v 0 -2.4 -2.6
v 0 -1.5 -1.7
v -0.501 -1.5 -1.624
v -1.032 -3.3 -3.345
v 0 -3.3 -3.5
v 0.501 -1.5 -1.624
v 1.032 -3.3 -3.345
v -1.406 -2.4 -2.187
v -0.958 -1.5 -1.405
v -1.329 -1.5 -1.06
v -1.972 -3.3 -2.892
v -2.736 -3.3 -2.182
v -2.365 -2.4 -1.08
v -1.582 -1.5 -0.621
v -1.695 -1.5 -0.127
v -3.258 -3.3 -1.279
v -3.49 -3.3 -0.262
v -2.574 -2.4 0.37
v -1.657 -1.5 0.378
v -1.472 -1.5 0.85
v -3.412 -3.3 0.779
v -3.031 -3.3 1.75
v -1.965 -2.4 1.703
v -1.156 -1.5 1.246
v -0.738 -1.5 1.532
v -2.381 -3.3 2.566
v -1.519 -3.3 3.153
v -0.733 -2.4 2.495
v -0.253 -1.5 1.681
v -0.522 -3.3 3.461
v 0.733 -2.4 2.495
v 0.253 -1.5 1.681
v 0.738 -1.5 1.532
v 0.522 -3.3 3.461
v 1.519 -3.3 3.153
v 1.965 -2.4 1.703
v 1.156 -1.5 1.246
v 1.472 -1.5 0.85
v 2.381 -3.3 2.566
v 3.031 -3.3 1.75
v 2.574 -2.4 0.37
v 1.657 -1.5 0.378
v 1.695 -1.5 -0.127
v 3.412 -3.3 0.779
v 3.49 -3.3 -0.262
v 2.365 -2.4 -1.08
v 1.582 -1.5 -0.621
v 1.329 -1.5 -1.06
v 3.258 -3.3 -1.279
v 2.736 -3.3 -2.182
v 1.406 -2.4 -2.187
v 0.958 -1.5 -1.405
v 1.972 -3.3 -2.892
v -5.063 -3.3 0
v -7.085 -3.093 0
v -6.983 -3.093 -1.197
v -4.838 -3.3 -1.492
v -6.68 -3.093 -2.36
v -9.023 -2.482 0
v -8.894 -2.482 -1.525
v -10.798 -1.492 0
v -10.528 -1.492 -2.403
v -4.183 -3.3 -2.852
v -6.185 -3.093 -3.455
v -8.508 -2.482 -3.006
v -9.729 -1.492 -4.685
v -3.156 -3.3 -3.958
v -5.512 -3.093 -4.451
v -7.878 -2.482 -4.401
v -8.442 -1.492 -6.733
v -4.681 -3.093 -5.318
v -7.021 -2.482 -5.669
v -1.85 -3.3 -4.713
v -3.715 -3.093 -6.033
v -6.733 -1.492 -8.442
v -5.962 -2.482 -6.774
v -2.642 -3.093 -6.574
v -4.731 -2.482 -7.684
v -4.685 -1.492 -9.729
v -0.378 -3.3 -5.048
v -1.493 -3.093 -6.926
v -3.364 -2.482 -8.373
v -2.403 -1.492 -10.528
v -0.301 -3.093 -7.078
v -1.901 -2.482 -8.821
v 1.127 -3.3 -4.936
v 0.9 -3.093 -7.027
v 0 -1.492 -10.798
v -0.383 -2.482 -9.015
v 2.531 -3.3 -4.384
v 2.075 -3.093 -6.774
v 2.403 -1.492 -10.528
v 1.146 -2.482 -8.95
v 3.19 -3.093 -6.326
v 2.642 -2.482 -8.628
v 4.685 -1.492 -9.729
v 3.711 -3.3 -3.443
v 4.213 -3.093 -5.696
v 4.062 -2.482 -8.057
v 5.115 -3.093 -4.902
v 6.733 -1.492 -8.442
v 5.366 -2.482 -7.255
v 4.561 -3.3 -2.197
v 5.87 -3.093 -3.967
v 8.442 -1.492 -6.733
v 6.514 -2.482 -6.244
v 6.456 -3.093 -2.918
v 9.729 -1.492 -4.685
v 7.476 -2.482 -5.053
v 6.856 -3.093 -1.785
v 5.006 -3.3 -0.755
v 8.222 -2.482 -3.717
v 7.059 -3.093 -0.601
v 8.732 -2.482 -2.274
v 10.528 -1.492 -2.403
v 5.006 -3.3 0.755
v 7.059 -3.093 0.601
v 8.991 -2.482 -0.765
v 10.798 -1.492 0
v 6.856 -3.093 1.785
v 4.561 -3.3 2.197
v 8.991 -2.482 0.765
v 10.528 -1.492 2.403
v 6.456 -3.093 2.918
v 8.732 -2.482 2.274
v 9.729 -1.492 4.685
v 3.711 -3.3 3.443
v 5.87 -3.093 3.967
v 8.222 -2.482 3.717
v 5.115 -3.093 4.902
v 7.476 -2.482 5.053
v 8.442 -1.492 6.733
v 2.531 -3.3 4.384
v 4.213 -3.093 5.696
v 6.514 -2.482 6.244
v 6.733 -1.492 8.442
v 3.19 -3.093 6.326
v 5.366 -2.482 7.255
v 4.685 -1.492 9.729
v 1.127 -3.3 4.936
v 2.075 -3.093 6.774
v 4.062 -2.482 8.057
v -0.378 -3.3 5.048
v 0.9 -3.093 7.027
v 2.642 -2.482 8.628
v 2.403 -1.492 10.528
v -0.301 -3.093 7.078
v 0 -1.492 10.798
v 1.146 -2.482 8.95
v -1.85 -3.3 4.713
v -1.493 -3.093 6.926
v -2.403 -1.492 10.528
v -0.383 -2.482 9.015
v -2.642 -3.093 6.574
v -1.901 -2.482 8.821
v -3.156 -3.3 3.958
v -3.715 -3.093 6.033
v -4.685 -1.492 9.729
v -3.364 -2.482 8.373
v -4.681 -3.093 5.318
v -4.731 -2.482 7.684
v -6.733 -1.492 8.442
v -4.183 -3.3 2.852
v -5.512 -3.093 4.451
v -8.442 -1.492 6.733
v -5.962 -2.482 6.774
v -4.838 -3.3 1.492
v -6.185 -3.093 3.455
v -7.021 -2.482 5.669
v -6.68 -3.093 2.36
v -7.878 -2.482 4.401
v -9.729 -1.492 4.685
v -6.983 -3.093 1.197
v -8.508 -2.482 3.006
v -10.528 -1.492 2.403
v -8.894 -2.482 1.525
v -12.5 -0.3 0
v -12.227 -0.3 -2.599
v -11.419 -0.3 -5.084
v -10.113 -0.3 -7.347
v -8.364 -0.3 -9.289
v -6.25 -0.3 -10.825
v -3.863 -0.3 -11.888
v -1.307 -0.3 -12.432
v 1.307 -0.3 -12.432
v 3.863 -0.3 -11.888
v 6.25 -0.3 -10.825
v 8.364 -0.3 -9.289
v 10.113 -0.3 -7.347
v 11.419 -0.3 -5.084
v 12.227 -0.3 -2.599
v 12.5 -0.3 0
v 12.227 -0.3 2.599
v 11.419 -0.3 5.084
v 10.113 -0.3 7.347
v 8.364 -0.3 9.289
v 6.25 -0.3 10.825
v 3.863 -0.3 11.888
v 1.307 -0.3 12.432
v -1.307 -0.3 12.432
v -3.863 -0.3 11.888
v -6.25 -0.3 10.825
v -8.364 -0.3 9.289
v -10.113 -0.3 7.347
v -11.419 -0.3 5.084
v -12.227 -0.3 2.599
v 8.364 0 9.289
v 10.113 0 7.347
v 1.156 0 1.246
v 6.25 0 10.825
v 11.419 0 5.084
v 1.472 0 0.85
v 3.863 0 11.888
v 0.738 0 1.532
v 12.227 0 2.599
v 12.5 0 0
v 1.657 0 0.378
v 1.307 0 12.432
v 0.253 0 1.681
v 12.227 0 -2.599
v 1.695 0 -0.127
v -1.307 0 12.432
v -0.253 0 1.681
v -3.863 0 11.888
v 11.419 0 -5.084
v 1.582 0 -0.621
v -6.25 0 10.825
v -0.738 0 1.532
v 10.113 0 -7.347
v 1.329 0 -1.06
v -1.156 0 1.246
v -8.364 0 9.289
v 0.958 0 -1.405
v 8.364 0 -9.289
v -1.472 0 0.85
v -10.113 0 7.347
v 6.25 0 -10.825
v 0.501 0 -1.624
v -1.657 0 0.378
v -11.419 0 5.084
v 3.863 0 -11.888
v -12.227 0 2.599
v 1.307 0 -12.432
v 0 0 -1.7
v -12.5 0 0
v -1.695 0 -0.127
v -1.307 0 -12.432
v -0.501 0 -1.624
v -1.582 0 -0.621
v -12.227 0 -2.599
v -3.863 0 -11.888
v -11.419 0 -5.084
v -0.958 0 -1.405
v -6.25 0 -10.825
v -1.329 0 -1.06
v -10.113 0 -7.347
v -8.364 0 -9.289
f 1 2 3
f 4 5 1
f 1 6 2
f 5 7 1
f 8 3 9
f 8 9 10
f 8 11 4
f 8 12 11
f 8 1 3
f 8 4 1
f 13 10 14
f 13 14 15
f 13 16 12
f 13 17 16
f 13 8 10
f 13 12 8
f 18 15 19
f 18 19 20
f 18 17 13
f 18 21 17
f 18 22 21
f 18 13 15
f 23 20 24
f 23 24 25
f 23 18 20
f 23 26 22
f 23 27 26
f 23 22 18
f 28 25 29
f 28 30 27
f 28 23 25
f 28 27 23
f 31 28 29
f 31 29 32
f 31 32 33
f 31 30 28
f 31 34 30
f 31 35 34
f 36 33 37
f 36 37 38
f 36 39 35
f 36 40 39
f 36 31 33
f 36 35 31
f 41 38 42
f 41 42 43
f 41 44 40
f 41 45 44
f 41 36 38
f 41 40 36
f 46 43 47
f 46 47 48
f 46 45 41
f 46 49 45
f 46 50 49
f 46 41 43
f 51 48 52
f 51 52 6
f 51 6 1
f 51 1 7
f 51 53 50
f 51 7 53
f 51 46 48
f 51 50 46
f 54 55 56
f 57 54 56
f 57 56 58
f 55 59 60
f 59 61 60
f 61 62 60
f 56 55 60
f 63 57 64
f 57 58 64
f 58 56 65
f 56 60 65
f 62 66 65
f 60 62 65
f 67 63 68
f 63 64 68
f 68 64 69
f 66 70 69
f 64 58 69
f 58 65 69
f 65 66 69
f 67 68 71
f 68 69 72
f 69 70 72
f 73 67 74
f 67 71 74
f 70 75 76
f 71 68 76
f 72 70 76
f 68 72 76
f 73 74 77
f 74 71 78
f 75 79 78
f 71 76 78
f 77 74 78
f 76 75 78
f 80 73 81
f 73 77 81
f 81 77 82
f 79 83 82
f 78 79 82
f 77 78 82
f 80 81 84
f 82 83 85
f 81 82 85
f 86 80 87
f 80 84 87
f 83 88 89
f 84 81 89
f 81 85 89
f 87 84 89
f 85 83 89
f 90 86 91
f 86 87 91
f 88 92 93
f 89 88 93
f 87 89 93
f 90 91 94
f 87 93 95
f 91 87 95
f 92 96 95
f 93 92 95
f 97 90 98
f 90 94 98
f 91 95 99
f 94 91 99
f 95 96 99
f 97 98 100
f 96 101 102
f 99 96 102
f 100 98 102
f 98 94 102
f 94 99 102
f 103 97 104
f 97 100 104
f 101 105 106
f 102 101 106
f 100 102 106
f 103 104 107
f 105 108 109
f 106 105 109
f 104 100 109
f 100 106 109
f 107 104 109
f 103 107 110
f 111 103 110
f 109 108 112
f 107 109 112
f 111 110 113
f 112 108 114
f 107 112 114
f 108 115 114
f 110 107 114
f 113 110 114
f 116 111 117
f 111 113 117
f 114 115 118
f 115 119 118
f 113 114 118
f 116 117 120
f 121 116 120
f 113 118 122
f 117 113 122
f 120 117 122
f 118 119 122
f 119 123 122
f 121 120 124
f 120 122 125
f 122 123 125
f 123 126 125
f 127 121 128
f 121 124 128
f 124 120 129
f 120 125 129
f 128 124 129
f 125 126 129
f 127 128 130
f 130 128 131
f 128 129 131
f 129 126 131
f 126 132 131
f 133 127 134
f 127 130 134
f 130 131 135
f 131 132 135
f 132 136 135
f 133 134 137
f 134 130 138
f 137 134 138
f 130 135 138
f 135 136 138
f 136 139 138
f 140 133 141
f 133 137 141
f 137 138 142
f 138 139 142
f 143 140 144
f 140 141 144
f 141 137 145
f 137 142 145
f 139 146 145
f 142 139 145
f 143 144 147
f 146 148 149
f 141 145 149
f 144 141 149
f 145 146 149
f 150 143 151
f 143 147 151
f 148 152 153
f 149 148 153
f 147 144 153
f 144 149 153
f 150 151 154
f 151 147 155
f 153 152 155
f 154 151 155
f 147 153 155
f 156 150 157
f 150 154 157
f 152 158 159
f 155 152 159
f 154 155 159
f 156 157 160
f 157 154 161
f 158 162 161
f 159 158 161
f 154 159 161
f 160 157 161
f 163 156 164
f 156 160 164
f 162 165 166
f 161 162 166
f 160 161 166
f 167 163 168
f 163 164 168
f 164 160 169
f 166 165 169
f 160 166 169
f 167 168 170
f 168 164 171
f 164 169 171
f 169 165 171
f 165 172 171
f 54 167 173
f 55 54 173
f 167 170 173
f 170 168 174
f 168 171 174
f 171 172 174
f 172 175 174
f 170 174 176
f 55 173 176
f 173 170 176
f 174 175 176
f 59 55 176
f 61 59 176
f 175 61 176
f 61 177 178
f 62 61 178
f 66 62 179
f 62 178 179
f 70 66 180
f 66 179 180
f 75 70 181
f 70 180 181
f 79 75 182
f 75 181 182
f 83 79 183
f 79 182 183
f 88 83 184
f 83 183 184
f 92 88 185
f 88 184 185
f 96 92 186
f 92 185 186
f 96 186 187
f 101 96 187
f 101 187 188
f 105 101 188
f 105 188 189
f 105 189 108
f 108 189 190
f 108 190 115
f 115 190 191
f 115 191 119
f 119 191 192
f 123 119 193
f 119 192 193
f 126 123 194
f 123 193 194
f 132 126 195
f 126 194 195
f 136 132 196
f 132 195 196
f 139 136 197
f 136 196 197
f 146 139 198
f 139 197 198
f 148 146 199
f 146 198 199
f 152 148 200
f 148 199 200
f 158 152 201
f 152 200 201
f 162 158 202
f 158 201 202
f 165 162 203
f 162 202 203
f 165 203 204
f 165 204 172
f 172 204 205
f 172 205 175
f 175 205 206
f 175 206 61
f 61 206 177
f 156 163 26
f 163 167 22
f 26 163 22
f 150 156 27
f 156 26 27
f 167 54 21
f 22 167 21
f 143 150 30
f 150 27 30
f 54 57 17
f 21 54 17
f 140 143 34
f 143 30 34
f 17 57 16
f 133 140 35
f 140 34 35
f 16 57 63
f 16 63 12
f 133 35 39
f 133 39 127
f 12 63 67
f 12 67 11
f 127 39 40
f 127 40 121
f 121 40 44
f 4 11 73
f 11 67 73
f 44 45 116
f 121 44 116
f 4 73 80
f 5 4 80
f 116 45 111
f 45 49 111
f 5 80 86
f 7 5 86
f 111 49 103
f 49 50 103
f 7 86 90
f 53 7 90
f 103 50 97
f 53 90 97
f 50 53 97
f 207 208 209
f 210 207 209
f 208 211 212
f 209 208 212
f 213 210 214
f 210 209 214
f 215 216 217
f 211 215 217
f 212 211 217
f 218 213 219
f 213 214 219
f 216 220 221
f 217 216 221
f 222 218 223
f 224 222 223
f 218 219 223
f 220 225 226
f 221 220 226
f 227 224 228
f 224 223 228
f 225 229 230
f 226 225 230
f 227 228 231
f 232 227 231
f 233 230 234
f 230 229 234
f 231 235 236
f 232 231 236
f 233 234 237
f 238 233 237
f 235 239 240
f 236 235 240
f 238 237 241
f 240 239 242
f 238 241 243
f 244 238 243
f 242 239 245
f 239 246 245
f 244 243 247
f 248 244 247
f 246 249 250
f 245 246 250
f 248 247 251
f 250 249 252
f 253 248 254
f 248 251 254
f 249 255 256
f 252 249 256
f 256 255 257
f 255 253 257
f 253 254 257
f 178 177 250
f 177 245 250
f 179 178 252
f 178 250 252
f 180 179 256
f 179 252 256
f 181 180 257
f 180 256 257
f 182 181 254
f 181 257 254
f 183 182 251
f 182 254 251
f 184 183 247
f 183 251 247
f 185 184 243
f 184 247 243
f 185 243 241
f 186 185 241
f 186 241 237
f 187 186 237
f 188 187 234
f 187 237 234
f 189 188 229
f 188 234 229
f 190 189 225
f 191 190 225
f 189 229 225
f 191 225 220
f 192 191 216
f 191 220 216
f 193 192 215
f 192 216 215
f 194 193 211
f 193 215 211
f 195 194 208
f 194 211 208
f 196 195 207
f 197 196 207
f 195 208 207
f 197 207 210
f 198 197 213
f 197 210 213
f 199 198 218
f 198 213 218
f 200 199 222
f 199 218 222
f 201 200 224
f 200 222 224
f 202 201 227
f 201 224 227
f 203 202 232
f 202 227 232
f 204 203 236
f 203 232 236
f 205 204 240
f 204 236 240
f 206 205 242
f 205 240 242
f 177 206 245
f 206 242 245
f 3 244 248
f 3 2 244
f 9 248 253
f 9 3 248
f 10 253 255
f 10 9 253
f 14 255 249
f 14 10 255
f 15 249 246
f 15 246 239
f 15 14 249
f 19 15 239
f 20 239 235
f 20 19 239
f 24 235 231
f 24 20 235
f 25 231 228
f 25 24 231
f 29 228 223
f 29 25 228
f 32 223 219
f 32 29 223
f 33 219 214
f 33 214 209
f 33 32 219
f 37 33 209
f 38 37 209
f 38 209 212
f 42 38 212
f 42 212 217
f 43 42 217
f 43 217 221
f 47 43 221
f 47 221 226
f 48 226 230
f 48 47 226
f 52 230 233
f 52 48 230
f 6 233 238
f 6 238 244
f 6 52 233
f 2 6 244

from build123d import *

# Parameters (mm, degrees)
CONG_1_R = 10


with BuildPart() as part:
    # Esquisse1 → Révolution1 (revolve)
    with BuildSketch(Plane.XY, mode=Mode.PRIVATE) as r_volution1_sk:
        Polygon((0, -3.3), (8.21555598, -3.3), (12.5, -0.3), (12.5, 0), (0, 0), align=None)
    revolve(r_volution1_sk.sketch.rotate(Axis((0, 0, 0), (0, -1, 0)), 180), axis=Axis((0, 0, 0), (0, -1, 0)))

    # Congé1
    cong_1_edges = [part.edges().sort_by_distance(p)[0] for p in [
        (8.21555598, -3.3, 0),
    ]]
    fillet(cong_1_edges, radius=CONG_1_R)

    # Esquisse2 → Fraisage pour vis à tête fraisée M31 (revolve, cut)
    with BuildSketch(Plane(origin=(0, -3.3, 0), x_dir=(0, 0, -1), z_dir=(1, 0, 0))):
        Polygon((0, 0), (0, 3.3), (1.7, 3.3), (1.7, 1.8), (3.5, 0), align=None)
    revolve(axis=Axis((0, -9.65, 0), (0, 1, 0)), mode=Mode.SUBTRACT)


solid = part.part
